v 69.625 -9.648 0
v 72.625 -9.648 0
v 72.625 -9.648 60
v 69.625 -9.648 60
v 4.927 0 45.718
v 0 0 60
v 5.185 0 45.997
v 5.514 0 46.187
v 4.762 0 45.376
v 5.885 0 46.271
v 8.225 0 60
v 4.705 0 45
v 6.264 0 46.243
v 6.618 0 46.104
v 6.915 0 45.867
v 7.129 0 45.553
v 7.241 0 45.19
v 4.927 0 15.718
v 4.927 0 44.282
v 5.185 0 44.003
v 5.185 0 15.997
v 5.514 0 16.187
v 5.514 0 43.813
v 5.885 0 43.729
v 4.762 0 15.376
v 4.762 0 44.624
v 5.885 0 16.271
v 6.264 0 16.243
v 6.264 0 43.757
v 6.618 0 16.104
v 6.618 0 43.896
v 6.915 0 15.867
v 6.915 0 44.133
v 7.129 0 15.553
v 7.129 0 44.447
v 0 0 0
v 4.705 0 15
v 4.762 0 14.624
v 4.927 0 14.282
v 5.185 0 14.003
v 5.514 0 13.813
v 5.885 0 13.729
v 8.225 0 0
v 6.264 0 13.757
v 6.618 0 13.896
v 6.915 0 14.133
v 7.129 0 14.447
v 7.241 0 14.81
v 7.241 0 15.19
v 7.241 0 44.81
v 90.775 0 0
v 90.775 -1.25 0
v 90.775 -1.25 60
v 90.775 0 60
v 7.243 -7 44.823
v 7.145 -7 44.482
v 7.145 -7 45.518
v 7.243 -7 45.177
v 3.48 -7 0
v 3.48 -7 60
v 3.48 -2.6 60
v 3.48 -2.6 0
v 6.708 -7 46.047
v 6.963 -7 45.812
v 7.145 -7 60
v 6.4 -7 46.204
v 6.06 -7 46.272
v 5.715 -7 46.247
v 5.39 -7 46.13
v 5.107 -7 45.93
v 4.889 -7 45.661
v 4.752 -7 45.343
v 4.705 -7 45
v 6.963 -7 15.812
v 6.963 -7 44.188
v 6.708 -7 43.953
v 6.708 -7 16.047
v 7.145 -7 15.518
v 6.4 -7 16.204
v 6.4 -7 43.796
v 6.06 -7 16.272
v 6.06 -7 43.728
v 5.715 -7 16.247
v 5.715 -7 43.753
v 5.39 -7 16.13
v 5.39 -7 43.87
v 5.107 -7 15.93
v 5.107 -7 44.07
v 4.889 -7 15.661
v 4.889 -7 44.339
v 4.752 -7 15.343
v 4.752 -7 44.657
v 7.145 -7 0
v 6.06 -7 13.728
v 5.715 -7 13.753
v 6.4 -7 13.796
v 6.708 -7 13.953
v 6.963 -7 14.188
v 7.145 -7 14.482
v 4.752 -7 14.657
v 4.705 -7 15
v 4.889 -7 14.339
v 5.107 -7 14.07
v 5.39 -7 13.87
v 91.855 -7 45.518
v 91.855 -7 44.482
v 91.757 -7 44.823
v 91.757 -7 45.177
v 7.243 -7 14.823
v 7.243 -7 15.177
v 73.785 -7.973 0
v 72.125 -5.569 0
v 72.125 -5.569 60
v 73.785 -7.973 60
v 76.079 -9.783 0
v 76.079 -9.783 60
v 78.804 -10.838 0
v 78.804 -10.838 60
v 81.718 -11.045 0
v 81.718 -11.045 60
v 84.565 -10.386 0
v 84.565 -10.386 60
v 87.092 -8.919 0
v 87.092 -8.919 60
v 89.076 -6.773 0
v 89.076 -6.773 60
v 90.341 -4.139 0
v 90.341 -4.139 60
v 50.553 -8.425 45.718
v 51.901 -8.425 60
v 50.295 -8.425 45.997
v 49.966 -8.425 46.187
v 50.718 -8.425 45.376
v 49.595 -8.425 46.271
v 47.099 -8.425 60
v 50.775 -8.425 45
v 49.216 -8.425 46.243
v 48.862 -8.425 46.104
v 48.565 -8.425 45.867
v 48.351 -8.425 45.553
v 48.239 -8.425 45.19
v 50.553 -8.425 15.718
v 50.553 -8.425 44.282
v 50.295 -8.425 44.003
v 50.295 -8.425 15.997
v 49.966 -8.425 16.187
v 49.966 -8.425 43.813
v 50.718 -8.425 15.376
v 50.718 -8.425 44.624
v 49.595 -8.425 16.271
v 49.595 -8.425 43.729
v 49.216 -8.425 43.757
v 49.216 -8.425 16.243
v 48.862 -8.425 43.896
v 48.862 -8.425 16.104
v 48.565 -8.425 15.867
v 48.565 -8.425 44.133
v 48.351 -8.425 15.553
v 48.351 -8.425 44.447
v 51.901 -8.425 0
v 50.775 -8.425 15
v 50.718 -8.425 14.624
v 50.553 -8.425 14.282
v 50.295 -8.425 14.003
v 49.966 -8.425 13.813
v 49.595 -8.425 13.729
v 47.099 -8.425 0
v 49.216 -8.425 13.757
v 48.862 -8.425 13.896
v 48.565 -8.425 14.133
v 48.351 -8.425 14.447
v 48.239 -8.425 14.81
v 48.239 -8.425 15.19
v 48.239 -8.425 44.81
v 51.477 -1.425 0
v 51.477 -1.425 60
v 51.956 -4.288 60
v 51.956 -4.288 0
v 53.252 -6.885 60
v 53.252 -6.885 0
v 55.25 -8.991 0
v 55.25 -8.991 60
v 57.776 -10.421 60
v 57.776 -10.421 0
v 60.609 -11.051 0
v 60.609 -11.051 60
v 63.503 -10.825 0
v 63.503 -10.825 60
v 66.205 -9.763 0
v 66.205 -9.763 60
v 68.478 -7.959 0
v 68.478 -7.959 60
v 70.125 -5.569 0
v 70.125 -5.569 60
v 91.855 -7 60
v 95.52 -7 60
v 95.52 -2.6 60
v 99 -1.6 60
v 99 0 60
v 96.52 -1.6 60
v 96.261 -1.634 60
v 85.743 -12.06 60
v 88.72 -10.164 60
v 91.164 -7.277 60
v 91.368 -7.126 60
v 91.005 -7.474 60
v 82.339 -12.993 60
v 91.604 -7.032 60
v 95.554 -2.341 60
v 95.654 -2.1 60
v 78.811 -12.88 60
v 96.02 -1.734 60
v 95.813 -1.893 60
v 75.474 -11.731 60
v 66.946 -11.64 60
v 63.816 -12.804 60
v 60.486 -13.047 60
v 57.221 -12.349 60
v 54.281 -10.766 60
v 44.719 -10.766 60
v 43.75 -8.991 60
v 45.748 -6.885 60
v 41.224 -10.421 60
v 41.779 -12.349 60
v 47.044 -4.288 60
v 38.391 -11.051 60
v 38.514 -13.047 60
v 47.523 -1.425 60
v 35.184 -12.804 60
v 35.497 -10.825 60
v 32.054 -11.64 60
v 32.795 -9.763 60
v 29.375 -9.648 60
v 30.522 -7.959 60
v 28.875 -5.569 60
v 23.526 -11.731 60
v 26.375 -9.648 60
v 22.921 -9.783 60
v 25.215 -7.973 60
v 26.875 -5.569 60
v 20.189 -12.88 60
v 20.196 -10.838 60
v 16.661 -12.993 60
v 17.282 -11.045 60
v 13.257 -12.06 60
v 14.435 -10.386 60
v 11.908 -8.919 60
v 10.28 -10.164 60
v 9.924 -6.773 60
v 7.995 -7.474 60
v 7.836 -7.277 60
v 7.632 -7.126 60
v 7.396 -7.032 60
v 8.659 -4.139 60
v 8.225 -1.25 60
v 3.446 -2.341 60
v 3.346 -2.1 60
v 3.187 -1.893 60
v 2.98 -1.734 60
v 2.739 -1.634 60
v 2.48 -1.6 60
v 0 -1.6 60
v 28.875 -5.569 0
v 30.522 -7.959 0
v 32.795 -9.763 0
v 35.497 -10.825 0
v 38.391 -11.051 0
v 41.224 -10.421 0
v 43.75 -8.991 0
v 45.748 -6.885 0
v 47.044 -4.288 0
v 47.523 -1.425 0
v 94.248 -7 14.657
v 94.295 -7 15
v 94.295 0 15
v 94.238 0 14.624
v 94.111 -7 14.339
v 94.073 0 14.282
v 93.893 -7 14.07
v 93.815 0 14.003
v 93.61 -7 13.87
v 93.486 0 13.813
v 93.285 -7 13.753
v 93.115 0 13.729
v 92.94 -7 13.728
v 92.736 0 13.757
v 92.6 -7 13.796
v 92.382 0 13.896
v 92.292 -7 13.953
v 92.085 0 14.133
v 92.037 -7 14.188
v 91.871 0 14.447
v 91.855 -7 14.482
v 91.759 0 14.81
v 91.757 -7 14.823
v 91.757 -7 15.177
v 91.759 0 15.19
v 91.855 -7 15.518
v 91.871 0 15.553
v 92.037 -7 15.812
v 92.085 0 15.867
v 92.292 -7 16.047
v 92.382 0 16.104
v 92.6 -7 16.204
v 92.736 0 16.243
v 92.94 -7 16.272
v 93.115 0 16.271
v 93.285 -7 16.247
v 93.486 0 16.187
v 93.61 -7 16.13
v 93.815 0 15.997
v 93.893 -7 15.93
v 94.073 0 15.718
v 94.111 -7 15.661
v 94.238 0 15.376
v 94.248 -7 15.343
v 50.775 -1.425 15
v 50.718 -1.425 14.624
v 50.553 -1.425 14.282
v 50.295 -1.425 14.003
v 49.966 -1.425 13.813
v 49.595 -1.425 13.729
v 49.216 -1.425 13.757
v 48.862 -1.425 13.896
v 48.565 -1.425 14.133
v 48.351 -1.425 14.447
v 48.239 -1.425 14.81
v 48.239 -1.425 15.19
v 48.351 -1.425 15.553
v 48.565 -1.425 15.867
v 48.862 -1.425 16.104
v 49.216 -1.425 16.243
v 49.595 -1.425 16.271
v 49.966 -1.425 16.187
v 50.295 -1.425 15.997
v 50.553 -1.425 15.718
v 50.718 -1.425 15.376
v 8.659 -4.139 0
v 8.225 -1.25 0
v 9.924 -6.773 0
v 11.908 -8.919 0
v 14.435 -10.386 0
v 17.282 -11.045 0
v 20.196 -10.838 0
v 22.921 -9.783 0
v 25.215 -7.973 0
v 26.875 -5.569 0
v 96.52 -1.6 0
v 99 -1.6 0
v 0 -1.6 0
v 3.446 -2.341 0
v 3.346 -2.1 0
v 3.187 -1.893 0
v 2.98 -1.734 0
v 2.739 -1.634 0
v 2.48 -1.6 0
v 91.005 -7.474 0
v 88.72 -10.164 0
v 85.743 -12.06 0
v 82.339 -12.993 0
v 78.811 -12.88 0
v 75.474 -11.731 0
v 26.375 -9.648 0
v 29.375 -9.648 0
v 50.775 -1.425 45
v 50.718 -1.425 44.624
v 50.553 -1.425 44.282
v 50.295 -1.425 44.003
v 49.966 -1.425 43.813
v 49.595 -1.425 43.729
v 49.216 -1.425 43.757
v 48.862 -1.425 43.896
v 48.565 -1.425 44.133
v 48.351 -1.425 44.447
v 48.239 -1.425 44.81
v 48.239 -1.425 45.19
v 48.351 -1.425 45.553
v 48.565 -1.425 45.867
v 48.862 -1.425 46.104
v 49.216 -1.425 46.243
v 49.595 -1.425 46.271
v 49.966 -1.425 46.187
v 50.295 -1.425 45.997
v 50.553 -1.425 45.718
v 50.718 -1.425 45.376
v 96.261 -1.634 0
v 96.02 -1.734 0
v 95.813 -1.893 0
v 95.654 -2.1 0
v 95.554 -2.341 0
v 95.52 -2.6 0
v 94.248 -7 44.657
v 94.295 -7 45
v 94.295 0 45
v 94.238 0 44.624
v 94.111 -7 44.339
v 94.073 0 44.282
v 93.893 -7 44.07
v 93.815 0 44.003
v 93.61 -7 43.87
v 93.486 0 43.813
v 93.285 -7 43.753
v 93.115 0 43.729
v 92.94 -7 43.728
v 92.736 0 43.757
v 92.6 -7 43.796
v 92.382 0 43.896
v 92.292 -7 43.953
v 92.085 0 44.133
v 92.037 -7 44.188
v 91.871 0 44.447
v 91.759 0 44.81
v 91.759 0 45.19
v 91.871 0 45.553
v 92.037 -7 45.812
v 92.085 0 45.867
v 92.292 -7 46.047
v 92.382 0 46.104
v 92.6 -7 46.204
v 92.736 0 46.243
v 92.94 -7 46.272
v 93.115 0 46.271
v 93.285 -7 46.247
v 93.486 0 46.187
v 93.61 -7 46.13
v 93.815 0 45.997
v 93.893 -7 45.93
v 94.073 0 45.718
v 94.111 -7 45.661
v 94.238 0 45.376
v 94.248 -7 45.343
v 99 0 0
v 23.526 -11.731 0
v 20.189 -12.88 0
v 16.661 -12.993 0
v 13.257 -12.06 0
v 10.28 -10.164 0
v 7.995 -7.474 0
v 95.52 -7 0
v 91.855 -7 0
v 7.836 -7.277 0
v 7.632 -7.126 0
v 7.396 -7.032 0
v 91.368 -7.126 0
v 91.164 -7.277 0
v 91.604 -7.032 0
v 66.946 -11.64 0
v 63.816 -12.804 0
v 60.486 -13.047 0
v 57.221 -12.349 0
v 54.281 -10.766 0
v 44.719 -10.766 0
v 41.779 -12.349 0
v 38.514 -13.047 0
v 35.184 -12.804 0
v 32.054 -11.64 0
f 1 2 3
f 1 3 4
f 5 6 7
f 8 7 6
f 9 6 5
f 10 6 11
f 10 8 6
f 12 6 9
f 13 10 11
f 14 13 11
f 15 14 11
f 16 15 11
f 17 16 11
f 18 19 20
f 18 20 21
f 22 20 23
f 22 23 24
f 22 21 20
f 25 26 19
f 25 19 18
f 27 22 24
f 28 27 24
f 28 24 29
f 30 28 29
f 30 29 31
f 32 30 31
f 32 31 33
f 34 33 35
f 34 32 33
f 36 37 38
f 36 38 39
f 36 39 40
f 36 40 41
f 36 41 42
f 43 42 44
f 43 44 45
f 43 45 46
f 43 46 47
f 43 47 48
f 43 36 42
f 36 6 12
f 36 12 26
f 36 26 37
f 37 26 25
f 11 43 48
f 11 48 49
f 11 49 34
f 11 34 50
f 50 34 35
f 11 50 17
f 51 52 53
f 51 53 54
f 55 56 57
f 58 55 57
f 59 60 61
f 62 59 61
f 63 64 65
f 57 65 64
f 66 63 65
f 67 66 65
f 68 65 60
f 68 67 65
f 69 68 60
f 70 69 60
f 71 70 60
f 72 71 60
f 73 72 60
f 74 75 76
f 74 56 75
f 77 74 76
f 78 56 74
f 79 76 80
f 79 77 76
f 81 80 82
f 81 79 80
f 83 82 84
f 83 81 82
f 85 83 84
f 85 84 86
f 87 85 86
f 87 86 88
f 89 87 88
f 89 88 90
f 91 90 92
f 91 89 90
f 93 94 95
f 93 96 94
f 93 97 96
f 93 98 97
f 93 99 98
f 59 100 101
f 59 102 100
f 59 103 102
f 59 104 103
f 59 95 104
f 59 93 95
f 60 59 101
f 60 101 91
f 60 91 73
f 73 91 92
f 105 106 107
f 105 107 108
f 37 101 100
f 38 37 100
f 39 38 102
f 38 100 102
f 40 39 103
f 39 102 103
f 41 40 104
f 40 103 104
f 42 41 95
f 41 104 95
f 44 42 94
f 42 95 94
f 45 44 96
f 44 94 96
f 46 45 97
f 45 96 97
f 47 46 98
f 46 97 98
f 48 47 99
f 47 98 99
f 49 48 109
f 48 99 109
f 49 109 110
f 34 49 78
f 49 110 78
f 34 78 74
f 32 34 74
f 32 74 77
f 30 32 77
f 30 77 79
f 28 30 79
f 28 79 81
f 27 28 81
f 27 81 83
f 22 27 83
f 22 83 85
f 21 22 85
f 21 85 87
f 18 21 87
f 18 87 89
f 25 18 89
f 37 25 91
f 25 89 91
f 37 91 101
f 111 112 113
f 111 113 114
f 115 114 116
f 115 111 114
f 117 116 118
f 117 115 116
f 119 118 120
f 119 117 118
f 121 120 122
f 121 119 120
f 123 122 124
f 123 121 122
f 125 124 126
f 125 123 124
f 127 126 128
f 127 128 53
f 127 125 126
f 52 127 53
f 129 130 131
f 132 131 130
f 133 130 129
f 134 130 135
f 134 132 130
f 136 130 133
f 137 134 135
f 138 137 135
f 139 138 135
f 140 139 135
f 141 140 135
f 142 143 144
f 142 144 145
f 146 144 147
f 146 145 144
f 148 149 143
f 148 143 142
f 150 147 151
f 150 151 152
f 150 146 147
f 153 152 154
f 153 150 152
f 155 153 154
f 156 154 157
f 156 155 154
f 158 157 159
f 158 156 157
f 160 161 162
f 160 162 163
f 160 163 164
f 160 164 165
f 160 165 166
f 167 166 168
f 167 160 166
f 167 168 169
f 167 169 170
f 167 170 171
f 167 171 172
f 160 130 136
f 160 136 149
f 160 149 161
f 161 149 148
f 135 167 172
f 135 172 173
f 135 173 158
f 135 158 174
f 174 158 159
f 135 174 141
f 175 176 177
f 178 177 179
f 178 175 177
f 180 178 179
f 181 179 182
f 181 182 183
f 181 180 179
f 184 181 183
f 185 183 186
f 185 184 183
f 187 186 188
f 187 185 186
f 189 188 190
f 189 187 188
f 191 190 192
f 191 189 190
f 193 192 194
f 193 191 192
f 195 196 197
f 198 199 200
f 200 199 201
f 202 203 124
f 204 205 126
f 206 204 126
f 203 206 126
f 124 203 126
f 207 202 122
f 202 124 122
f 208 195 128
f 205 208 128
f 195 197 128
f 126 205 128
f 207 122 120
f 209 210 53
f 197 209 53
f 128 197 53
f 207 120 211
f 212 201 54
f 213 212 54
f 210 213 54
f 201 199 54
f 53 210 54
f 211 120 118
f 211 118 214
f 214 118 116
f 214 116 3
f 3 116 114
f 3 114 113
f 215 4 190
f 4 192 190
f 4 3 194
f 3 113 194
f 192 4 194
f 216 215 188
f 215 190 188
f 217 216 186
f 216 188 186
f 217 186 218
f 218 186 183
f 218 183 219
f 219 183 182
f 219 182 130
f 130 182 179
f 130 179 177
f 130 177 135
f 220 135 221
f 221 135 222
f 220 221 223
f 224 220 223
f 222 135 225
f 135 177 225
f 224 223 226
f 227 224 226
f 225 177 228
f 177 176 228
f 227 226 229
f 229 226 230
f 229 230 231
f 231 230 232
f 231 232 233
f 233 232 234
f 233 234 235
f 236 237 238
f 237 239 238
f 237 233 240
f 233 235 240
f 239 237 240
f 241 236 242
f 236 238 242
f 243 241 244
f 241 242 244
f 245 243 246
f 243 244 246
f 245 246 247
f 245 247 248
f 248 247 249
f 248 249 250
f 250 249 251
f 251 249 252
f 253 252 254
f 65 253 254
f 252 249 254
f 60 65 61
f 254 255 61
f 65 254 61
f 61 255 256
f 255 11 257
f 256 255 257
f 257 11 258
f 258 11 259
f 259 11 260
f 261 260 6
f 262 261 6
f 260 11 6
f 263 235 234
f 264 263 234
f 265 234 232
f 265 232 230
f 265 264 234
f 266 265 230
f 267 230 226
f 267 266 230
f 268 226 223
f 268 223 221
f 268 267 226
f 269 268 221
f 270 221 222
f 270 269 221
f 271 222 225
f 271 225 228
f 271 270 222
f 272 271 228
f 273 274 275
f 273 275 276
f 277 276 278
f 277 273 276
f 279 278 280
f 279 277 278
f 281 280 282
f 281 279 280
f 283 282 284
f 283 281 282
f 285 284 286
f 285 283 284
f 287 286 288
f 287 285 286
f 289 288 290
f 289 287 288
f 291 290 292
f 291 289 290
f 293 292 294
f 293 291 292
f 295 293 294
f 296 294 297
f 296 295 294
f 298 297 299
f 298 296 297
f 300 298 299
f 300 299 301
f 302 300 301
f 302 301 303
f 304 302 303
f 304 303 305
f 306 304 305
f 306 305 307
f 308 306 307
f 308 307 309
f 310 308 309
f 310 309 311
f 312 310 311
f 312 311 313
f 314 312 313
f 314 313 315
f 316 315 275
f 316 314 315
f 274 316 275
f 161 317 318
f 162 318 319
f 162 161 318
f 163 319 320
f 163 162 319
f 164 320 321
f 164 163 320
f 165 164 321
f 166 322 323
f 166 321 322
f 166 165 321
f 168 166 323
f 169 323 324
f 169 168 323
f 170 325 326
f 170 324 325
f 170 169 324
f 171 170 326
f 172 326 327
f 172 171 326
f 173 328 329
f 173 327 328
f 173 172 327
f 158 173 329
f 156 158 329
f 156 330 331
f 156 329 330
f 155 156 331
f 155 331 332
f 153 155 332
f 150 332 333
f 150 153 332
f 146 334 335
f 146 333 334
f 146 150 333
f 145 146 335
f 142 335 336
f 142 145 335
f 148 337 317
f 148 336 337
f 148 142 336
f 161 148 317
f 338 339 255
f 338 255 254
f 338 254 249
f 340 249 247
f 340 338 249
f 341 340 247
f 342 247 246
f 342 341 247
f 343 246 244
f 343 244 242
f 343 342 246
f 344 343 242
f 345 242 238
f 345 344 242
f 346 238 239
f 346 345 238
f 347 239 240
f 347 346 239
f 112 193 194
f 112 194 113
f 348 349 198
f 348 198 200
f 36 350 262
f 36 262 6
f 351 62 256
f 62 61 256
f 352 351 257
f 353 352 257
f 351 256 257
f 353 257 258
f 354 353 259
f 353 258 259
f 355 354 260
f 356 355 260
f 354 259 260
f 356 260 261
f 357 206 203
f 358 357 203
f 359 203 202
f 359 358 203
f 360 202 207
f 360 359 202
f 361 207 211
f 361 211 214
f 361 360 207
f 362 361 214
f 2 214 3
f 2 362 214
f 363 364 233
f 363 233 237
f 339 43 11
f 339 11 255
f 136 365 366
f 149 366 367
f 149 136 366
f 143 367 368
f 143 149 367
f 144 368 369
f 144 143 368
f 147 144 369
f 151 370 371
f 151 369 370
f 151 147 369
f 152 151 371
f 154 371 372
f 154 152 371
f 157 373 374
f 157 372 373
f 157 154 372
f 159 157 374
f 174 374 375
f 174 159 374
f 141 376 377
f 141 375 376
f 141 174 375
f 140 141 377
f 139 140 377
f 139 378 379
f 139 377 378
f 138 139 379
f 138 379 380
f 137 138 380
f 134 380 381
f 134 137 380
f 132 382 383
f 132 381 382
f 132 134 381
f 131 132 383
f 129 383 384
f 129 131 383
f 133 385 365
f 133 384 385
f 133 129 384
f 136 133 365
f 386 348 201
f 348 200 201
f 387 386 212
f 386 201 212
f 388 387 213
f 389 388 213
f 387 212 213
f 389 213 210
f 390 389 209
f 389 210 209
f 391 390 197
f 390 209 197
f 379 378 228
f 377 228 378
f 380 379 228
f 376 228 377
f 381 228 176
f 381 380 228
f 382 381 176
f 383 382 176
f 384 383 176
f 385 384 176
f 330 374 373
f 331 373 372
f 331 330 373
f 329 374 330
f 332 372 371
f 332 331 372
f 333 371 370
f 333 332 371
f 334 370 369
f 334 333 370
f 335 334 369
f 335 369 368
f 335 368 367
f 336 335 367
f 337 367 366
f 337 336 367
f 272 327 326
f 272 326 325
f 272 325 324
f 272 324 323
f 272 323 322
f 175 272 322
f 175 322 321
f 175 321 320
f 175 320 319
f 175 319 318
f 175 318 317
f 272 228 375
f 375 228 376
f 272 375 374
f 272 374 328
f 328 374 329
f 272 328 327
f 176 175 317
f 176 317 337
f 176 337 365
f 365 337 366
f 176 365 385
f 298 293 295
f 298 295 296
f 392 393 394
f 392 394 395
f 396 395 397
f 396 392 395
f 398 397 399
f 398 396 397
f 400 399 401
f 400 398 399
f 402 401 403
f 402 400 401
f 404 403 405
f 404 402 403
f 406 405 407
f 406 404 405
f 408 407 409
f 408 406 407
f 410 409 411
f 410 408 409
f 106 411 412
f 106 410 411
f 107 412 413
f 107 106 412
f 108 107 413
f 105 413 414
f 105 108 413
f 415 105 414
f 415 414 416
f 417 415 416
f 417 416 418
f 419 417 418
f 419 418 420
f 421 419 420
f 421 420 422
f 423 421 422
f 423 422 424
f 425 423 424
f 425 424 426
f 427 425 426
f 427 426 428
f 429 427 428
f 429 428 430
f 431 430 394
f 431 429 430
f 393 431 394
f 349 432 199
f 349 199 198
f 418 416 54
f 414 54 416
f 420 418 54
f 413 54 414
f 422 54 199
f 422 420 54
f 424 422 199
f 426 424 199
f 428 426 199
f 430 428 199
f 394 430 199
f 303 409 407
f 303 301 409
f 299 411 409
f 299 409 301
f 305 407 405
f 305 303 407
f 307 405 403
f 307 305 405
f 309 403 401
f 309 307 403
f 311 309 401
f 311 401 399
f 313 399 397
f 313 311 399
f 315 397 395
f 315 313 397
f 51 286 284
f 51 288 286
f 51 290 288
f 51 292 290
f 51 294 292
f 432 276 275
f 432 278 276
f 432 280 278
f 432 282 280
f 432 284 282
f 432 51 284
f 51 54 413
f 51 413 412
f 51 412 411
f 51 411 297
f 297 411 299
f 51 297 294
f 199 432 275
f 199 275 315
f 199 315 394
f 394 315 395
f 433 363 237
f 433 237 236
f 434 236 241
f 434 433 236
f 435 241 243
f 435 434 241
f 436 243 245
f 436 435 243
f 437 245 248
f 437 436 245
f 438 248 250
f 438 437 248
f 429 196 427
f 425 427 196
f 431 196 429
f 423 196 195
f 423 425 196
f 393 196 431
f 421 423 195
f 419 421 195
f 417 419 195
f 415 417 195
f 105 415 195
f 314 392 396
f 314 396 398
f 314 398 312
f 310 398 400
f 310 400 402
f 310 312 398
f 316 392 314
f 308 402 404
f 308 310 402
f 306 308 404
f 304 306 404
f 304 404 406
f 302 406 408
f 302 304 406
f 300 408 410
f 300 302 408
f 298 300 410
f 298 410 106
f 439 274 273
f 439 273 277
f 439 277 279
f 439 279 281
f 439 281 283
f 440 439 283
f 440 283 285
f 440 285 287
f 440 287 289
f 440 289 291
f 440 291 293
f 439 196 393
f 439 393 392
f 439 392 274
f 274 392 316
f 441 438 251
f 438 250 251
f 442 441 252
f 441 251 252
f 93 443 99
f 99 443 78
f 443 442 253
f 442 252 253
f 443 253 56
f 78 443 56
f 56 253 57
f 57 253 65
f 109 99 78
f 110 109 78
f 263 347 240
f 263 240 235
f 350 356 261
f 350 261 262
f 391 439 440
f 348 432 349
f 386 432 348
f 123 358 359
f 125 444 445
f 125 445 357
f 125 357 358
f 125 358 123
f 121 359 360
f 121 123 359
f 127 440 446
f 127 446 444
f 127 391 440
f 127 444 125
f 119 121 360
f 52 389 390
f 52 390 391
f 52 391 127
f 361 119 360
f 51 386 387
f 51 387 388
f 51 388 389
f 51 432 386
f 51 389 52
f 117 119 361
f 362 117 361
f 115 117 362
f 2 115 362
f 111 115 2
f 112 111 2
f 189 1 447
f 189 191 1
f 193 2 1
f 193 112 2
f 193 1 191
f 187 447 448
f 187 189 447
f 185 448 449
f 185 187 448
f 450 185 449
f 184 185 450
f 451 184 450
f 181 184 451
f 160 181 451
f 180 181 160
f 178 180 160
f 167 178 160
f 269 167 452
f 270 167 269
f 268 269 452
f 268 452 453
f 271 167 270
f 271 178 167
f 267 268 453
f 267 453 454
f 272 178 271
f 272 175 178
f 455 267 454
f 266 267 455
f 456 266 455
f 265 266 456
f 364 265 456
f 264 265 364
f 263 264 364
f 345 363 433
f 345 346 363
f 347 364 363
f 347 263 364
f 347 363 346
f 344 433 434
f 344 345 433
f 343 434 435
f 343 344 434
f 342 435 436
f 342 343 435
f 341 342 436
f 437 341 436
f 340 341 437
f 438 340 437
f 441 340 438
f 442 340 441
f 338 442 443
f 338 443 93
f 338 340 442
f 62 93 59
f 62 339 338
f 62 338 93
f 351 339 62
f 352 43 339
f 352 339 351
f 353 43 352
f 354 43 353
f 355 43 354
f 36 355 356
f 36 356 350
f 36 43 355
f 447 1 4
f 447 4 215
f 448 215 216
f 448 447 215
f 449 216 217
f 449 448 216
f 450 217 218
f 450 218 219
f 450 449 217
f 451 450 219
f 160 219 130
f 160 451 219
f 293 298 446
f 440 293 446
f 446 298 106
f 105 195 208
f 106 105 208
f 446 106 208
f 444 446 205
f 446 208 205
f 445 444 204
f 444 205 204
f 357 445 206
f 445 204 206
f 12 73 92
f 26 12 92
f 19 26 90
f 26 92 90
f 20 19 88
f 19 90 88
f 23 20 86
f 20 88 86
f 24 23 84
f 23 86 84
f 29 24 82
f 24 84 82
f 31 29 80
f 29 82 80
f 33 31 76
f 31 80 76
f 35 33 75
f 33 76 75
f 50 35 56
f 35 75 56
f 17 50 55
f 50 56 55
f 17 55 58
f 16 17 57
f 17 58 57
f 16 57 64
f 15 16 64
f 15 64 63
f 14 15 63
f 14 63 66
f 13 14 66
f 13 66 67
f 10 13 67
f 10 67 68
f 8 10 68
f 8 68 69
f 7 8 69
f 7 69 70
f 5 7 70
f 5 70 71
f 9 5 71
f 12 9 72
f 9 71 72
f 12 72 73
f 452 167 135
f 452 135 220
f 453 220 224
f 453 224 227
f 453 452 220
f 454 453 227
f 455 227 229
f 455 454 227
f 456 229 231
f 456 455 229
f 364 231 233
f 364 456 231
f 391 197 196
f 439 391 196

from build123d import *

# Parameters (mm, degrees)
BOSS_EXTRUDE1_DEPTH                         = 60
FILLET1_R                                   = 1
TAPPED_START                                = -7
TAPPED_HOLE_FOR_M2_5X0_45_HELICOIL1_OUTL_R  = 1.275
TAPPED_HOLE_FOR_M2_5X0_45_HELICOIL1_DEPTH   = 7
TAPPED_START_2                              = -8.425
TAPPED_HOLE_FOR_M2_5X0_45_HELICOIL1_2_OU_R  = 1.275
TAPPED_HOLE_FOR_M2_5X0_45_HELICOIL1_2_DEPTH = 1.425


# Read off the part's stored shape, not the designer's step: Tapped Hole for M2.5x0.45 Helicoil1
with BuildPart() as part:
    # Sketch1 → Boss-Extrude1 (new body)
    with BuildSketch(Plane.XY):
        with BuildLine():
            Line((0, 0), (8.225, 0))
            Line((8.225, 0), (8.225, -1.25))
            ThreePointArc((8.225, -1.25), (15.833583974, -10.821735736), (26.875, -5.568564576))
            Line((26.875, -5.568564576), (28.875, -5.568564576))
            ThreePointArc((28.875, -5.568564576), (39.831080274, -10.841095968), (47.523441352, -1.425))
            Line((47.523441352, -1.425), (51.476558648, -1.425))
            ThreePointArc((51.476558648, -1.425), (59.168919726, -10.841095968), (70.125, -5.568564576))
            Line((70.125, -5.568564576), (72.125, -5.568564576))
            ThreePointArc((72.125, -5.568564576), (83.166416026, -10.821735736), (90.775, -1.25))
            Line((90.775, -1.25), (90.775, 0))
            Line((90.775, 0), (99, 0))
            Line((99, 0), (99, -1.6))
            Line((99, -1.6), (95.52, -1.6))
            Line((95.52, -1.6), (95.52, -7))
            Line((95.52, -7), (91.282866253, -7))
            ThreePointArc((91.282866253, -7), (82.611549593, -12.957684568), (72.625, -9.647916408))
            Line((72.625, -9.647916408), (69.625, -9.647916408))
            ThreePointArc((69.625, -9.647916408), (60.486058022, -13.046953991), (51.90053193, -8.425))
            Line((51.90053193, -8.425), (47.09946807, -8.425))
            ThreePointArc((47.09946807, -8.425), (38.513941978, -13.046953991), (29.375, -9.647916408))
            Line((29.375, -9.647916408), (26.375, -9.647916408))
            ThreePointArc((26.375, -9.647916408), (16.388450407, -12.957684568), (7.717133747, -7))
            Line((7.717133747, -7), (3.48, -7))
            Line((3.48, -7), (3.48, -1.6))
            Line((3.48, -1.6), (0, -1.6))
            Line((0, -1.6), (0, 0))
        make_face()
    extrude(amount=BOSS_EXTRUDE1_DEPTH)

    # Fillet1
    fillet1_edges = [part.edges().sort_by_distance(p)[0] for p in [
        (95.52, -1.6, 30),
        (91.282866253, -7, 30),
        (7.717133747, -7, 30),
        (3.48, -1.6, 30),
    ]]
    fillet(fillet1_edges, radius=FILLET1_R)

    # Tapped Hole for M2.5x0.45 Helicoil1 outl → Tapped Hole for M2.5x0.45 Helicoil1 (cut)
    with BuildSketch(Plane(origin=(0, 0, 0), x_dir=(1, 0, 0), z_dir=(0, 1, 0)).offset(TAPPED_START)):
        with Locations((93.02, -15)):
            Circle(TAPPED_HOLE_FOR_M2_5X0_45_HELICOIL1_OUTL_R)
        with Locations((93.02, -45)):
            Circle(TAPPED_HOLE_FOR_M2_5X0_45_HELICOIL1_OUTL_R)
        with Locations((49.5, -15)):
            Circle(TAPPED_HOLE_FOR_M2_5X0_45_HELICOIL1_OUTL_R)
        with Locations((49.5, -45)):
            Circle(TAPPED_HOLE_FOR_M2_5X0_45_HELICOIL1_OUTL_R)
    tapped_hole_for_m2_5x0_45_helicoil1 = extrude(amount=TAPPED_HOLE_FOR_M2_5X0_45_HELICOIL1_DEPTH, mode=Mode.SUBTRACT)

    # Tapped Hole for M2.5x0.45 Helicoil1 2 ou → Tapped Hole for M2.5x0.45 Helicoil1 2 (cut)
    with BuildSketch(Plane(origin=(0, 0, 0), x_dir=(1, 0, 0), z_dir=(0, 1, 0)).offset(TAPPED_START_2)):
        with Locations((49.5, -15)):
            Circle(TAPPED_HOLE_FOR_M2_5X0_45_HELICOIL1_2_OU_R)
        with Locations((49.5, -45)):
            Circle(TAPPED_HOLE_FOR_M2_5X0_45_HELICOIL1_2_OU_R)
    tapped_hole_for_m2_5x0_45_helicoil1_2 = extrude(amount=TAPPED_HOLE_FOR_M2_5X0_45_HELICOIL1_2_DEPTH, mode=Mode.SUBTRACT)

    # Mirror1: Tapped Hole for M2.5x0.45 Helicoil1, Tapped Hole for M2.5x0.45 Helicoil1 2 across plane
    add(tapped_hole_for_m2_5x0_45_helicoil1.mirror(Plane.ZY.offset(-49.5)), mode=Mode.SUBTRACT)
    add(tapped_hole_for_m2_5x0_45_helicoil1_2.mirror(Plane.ZY.offset(-49.5)), mode=Mode.SUBTRACT)


solid = part.part
